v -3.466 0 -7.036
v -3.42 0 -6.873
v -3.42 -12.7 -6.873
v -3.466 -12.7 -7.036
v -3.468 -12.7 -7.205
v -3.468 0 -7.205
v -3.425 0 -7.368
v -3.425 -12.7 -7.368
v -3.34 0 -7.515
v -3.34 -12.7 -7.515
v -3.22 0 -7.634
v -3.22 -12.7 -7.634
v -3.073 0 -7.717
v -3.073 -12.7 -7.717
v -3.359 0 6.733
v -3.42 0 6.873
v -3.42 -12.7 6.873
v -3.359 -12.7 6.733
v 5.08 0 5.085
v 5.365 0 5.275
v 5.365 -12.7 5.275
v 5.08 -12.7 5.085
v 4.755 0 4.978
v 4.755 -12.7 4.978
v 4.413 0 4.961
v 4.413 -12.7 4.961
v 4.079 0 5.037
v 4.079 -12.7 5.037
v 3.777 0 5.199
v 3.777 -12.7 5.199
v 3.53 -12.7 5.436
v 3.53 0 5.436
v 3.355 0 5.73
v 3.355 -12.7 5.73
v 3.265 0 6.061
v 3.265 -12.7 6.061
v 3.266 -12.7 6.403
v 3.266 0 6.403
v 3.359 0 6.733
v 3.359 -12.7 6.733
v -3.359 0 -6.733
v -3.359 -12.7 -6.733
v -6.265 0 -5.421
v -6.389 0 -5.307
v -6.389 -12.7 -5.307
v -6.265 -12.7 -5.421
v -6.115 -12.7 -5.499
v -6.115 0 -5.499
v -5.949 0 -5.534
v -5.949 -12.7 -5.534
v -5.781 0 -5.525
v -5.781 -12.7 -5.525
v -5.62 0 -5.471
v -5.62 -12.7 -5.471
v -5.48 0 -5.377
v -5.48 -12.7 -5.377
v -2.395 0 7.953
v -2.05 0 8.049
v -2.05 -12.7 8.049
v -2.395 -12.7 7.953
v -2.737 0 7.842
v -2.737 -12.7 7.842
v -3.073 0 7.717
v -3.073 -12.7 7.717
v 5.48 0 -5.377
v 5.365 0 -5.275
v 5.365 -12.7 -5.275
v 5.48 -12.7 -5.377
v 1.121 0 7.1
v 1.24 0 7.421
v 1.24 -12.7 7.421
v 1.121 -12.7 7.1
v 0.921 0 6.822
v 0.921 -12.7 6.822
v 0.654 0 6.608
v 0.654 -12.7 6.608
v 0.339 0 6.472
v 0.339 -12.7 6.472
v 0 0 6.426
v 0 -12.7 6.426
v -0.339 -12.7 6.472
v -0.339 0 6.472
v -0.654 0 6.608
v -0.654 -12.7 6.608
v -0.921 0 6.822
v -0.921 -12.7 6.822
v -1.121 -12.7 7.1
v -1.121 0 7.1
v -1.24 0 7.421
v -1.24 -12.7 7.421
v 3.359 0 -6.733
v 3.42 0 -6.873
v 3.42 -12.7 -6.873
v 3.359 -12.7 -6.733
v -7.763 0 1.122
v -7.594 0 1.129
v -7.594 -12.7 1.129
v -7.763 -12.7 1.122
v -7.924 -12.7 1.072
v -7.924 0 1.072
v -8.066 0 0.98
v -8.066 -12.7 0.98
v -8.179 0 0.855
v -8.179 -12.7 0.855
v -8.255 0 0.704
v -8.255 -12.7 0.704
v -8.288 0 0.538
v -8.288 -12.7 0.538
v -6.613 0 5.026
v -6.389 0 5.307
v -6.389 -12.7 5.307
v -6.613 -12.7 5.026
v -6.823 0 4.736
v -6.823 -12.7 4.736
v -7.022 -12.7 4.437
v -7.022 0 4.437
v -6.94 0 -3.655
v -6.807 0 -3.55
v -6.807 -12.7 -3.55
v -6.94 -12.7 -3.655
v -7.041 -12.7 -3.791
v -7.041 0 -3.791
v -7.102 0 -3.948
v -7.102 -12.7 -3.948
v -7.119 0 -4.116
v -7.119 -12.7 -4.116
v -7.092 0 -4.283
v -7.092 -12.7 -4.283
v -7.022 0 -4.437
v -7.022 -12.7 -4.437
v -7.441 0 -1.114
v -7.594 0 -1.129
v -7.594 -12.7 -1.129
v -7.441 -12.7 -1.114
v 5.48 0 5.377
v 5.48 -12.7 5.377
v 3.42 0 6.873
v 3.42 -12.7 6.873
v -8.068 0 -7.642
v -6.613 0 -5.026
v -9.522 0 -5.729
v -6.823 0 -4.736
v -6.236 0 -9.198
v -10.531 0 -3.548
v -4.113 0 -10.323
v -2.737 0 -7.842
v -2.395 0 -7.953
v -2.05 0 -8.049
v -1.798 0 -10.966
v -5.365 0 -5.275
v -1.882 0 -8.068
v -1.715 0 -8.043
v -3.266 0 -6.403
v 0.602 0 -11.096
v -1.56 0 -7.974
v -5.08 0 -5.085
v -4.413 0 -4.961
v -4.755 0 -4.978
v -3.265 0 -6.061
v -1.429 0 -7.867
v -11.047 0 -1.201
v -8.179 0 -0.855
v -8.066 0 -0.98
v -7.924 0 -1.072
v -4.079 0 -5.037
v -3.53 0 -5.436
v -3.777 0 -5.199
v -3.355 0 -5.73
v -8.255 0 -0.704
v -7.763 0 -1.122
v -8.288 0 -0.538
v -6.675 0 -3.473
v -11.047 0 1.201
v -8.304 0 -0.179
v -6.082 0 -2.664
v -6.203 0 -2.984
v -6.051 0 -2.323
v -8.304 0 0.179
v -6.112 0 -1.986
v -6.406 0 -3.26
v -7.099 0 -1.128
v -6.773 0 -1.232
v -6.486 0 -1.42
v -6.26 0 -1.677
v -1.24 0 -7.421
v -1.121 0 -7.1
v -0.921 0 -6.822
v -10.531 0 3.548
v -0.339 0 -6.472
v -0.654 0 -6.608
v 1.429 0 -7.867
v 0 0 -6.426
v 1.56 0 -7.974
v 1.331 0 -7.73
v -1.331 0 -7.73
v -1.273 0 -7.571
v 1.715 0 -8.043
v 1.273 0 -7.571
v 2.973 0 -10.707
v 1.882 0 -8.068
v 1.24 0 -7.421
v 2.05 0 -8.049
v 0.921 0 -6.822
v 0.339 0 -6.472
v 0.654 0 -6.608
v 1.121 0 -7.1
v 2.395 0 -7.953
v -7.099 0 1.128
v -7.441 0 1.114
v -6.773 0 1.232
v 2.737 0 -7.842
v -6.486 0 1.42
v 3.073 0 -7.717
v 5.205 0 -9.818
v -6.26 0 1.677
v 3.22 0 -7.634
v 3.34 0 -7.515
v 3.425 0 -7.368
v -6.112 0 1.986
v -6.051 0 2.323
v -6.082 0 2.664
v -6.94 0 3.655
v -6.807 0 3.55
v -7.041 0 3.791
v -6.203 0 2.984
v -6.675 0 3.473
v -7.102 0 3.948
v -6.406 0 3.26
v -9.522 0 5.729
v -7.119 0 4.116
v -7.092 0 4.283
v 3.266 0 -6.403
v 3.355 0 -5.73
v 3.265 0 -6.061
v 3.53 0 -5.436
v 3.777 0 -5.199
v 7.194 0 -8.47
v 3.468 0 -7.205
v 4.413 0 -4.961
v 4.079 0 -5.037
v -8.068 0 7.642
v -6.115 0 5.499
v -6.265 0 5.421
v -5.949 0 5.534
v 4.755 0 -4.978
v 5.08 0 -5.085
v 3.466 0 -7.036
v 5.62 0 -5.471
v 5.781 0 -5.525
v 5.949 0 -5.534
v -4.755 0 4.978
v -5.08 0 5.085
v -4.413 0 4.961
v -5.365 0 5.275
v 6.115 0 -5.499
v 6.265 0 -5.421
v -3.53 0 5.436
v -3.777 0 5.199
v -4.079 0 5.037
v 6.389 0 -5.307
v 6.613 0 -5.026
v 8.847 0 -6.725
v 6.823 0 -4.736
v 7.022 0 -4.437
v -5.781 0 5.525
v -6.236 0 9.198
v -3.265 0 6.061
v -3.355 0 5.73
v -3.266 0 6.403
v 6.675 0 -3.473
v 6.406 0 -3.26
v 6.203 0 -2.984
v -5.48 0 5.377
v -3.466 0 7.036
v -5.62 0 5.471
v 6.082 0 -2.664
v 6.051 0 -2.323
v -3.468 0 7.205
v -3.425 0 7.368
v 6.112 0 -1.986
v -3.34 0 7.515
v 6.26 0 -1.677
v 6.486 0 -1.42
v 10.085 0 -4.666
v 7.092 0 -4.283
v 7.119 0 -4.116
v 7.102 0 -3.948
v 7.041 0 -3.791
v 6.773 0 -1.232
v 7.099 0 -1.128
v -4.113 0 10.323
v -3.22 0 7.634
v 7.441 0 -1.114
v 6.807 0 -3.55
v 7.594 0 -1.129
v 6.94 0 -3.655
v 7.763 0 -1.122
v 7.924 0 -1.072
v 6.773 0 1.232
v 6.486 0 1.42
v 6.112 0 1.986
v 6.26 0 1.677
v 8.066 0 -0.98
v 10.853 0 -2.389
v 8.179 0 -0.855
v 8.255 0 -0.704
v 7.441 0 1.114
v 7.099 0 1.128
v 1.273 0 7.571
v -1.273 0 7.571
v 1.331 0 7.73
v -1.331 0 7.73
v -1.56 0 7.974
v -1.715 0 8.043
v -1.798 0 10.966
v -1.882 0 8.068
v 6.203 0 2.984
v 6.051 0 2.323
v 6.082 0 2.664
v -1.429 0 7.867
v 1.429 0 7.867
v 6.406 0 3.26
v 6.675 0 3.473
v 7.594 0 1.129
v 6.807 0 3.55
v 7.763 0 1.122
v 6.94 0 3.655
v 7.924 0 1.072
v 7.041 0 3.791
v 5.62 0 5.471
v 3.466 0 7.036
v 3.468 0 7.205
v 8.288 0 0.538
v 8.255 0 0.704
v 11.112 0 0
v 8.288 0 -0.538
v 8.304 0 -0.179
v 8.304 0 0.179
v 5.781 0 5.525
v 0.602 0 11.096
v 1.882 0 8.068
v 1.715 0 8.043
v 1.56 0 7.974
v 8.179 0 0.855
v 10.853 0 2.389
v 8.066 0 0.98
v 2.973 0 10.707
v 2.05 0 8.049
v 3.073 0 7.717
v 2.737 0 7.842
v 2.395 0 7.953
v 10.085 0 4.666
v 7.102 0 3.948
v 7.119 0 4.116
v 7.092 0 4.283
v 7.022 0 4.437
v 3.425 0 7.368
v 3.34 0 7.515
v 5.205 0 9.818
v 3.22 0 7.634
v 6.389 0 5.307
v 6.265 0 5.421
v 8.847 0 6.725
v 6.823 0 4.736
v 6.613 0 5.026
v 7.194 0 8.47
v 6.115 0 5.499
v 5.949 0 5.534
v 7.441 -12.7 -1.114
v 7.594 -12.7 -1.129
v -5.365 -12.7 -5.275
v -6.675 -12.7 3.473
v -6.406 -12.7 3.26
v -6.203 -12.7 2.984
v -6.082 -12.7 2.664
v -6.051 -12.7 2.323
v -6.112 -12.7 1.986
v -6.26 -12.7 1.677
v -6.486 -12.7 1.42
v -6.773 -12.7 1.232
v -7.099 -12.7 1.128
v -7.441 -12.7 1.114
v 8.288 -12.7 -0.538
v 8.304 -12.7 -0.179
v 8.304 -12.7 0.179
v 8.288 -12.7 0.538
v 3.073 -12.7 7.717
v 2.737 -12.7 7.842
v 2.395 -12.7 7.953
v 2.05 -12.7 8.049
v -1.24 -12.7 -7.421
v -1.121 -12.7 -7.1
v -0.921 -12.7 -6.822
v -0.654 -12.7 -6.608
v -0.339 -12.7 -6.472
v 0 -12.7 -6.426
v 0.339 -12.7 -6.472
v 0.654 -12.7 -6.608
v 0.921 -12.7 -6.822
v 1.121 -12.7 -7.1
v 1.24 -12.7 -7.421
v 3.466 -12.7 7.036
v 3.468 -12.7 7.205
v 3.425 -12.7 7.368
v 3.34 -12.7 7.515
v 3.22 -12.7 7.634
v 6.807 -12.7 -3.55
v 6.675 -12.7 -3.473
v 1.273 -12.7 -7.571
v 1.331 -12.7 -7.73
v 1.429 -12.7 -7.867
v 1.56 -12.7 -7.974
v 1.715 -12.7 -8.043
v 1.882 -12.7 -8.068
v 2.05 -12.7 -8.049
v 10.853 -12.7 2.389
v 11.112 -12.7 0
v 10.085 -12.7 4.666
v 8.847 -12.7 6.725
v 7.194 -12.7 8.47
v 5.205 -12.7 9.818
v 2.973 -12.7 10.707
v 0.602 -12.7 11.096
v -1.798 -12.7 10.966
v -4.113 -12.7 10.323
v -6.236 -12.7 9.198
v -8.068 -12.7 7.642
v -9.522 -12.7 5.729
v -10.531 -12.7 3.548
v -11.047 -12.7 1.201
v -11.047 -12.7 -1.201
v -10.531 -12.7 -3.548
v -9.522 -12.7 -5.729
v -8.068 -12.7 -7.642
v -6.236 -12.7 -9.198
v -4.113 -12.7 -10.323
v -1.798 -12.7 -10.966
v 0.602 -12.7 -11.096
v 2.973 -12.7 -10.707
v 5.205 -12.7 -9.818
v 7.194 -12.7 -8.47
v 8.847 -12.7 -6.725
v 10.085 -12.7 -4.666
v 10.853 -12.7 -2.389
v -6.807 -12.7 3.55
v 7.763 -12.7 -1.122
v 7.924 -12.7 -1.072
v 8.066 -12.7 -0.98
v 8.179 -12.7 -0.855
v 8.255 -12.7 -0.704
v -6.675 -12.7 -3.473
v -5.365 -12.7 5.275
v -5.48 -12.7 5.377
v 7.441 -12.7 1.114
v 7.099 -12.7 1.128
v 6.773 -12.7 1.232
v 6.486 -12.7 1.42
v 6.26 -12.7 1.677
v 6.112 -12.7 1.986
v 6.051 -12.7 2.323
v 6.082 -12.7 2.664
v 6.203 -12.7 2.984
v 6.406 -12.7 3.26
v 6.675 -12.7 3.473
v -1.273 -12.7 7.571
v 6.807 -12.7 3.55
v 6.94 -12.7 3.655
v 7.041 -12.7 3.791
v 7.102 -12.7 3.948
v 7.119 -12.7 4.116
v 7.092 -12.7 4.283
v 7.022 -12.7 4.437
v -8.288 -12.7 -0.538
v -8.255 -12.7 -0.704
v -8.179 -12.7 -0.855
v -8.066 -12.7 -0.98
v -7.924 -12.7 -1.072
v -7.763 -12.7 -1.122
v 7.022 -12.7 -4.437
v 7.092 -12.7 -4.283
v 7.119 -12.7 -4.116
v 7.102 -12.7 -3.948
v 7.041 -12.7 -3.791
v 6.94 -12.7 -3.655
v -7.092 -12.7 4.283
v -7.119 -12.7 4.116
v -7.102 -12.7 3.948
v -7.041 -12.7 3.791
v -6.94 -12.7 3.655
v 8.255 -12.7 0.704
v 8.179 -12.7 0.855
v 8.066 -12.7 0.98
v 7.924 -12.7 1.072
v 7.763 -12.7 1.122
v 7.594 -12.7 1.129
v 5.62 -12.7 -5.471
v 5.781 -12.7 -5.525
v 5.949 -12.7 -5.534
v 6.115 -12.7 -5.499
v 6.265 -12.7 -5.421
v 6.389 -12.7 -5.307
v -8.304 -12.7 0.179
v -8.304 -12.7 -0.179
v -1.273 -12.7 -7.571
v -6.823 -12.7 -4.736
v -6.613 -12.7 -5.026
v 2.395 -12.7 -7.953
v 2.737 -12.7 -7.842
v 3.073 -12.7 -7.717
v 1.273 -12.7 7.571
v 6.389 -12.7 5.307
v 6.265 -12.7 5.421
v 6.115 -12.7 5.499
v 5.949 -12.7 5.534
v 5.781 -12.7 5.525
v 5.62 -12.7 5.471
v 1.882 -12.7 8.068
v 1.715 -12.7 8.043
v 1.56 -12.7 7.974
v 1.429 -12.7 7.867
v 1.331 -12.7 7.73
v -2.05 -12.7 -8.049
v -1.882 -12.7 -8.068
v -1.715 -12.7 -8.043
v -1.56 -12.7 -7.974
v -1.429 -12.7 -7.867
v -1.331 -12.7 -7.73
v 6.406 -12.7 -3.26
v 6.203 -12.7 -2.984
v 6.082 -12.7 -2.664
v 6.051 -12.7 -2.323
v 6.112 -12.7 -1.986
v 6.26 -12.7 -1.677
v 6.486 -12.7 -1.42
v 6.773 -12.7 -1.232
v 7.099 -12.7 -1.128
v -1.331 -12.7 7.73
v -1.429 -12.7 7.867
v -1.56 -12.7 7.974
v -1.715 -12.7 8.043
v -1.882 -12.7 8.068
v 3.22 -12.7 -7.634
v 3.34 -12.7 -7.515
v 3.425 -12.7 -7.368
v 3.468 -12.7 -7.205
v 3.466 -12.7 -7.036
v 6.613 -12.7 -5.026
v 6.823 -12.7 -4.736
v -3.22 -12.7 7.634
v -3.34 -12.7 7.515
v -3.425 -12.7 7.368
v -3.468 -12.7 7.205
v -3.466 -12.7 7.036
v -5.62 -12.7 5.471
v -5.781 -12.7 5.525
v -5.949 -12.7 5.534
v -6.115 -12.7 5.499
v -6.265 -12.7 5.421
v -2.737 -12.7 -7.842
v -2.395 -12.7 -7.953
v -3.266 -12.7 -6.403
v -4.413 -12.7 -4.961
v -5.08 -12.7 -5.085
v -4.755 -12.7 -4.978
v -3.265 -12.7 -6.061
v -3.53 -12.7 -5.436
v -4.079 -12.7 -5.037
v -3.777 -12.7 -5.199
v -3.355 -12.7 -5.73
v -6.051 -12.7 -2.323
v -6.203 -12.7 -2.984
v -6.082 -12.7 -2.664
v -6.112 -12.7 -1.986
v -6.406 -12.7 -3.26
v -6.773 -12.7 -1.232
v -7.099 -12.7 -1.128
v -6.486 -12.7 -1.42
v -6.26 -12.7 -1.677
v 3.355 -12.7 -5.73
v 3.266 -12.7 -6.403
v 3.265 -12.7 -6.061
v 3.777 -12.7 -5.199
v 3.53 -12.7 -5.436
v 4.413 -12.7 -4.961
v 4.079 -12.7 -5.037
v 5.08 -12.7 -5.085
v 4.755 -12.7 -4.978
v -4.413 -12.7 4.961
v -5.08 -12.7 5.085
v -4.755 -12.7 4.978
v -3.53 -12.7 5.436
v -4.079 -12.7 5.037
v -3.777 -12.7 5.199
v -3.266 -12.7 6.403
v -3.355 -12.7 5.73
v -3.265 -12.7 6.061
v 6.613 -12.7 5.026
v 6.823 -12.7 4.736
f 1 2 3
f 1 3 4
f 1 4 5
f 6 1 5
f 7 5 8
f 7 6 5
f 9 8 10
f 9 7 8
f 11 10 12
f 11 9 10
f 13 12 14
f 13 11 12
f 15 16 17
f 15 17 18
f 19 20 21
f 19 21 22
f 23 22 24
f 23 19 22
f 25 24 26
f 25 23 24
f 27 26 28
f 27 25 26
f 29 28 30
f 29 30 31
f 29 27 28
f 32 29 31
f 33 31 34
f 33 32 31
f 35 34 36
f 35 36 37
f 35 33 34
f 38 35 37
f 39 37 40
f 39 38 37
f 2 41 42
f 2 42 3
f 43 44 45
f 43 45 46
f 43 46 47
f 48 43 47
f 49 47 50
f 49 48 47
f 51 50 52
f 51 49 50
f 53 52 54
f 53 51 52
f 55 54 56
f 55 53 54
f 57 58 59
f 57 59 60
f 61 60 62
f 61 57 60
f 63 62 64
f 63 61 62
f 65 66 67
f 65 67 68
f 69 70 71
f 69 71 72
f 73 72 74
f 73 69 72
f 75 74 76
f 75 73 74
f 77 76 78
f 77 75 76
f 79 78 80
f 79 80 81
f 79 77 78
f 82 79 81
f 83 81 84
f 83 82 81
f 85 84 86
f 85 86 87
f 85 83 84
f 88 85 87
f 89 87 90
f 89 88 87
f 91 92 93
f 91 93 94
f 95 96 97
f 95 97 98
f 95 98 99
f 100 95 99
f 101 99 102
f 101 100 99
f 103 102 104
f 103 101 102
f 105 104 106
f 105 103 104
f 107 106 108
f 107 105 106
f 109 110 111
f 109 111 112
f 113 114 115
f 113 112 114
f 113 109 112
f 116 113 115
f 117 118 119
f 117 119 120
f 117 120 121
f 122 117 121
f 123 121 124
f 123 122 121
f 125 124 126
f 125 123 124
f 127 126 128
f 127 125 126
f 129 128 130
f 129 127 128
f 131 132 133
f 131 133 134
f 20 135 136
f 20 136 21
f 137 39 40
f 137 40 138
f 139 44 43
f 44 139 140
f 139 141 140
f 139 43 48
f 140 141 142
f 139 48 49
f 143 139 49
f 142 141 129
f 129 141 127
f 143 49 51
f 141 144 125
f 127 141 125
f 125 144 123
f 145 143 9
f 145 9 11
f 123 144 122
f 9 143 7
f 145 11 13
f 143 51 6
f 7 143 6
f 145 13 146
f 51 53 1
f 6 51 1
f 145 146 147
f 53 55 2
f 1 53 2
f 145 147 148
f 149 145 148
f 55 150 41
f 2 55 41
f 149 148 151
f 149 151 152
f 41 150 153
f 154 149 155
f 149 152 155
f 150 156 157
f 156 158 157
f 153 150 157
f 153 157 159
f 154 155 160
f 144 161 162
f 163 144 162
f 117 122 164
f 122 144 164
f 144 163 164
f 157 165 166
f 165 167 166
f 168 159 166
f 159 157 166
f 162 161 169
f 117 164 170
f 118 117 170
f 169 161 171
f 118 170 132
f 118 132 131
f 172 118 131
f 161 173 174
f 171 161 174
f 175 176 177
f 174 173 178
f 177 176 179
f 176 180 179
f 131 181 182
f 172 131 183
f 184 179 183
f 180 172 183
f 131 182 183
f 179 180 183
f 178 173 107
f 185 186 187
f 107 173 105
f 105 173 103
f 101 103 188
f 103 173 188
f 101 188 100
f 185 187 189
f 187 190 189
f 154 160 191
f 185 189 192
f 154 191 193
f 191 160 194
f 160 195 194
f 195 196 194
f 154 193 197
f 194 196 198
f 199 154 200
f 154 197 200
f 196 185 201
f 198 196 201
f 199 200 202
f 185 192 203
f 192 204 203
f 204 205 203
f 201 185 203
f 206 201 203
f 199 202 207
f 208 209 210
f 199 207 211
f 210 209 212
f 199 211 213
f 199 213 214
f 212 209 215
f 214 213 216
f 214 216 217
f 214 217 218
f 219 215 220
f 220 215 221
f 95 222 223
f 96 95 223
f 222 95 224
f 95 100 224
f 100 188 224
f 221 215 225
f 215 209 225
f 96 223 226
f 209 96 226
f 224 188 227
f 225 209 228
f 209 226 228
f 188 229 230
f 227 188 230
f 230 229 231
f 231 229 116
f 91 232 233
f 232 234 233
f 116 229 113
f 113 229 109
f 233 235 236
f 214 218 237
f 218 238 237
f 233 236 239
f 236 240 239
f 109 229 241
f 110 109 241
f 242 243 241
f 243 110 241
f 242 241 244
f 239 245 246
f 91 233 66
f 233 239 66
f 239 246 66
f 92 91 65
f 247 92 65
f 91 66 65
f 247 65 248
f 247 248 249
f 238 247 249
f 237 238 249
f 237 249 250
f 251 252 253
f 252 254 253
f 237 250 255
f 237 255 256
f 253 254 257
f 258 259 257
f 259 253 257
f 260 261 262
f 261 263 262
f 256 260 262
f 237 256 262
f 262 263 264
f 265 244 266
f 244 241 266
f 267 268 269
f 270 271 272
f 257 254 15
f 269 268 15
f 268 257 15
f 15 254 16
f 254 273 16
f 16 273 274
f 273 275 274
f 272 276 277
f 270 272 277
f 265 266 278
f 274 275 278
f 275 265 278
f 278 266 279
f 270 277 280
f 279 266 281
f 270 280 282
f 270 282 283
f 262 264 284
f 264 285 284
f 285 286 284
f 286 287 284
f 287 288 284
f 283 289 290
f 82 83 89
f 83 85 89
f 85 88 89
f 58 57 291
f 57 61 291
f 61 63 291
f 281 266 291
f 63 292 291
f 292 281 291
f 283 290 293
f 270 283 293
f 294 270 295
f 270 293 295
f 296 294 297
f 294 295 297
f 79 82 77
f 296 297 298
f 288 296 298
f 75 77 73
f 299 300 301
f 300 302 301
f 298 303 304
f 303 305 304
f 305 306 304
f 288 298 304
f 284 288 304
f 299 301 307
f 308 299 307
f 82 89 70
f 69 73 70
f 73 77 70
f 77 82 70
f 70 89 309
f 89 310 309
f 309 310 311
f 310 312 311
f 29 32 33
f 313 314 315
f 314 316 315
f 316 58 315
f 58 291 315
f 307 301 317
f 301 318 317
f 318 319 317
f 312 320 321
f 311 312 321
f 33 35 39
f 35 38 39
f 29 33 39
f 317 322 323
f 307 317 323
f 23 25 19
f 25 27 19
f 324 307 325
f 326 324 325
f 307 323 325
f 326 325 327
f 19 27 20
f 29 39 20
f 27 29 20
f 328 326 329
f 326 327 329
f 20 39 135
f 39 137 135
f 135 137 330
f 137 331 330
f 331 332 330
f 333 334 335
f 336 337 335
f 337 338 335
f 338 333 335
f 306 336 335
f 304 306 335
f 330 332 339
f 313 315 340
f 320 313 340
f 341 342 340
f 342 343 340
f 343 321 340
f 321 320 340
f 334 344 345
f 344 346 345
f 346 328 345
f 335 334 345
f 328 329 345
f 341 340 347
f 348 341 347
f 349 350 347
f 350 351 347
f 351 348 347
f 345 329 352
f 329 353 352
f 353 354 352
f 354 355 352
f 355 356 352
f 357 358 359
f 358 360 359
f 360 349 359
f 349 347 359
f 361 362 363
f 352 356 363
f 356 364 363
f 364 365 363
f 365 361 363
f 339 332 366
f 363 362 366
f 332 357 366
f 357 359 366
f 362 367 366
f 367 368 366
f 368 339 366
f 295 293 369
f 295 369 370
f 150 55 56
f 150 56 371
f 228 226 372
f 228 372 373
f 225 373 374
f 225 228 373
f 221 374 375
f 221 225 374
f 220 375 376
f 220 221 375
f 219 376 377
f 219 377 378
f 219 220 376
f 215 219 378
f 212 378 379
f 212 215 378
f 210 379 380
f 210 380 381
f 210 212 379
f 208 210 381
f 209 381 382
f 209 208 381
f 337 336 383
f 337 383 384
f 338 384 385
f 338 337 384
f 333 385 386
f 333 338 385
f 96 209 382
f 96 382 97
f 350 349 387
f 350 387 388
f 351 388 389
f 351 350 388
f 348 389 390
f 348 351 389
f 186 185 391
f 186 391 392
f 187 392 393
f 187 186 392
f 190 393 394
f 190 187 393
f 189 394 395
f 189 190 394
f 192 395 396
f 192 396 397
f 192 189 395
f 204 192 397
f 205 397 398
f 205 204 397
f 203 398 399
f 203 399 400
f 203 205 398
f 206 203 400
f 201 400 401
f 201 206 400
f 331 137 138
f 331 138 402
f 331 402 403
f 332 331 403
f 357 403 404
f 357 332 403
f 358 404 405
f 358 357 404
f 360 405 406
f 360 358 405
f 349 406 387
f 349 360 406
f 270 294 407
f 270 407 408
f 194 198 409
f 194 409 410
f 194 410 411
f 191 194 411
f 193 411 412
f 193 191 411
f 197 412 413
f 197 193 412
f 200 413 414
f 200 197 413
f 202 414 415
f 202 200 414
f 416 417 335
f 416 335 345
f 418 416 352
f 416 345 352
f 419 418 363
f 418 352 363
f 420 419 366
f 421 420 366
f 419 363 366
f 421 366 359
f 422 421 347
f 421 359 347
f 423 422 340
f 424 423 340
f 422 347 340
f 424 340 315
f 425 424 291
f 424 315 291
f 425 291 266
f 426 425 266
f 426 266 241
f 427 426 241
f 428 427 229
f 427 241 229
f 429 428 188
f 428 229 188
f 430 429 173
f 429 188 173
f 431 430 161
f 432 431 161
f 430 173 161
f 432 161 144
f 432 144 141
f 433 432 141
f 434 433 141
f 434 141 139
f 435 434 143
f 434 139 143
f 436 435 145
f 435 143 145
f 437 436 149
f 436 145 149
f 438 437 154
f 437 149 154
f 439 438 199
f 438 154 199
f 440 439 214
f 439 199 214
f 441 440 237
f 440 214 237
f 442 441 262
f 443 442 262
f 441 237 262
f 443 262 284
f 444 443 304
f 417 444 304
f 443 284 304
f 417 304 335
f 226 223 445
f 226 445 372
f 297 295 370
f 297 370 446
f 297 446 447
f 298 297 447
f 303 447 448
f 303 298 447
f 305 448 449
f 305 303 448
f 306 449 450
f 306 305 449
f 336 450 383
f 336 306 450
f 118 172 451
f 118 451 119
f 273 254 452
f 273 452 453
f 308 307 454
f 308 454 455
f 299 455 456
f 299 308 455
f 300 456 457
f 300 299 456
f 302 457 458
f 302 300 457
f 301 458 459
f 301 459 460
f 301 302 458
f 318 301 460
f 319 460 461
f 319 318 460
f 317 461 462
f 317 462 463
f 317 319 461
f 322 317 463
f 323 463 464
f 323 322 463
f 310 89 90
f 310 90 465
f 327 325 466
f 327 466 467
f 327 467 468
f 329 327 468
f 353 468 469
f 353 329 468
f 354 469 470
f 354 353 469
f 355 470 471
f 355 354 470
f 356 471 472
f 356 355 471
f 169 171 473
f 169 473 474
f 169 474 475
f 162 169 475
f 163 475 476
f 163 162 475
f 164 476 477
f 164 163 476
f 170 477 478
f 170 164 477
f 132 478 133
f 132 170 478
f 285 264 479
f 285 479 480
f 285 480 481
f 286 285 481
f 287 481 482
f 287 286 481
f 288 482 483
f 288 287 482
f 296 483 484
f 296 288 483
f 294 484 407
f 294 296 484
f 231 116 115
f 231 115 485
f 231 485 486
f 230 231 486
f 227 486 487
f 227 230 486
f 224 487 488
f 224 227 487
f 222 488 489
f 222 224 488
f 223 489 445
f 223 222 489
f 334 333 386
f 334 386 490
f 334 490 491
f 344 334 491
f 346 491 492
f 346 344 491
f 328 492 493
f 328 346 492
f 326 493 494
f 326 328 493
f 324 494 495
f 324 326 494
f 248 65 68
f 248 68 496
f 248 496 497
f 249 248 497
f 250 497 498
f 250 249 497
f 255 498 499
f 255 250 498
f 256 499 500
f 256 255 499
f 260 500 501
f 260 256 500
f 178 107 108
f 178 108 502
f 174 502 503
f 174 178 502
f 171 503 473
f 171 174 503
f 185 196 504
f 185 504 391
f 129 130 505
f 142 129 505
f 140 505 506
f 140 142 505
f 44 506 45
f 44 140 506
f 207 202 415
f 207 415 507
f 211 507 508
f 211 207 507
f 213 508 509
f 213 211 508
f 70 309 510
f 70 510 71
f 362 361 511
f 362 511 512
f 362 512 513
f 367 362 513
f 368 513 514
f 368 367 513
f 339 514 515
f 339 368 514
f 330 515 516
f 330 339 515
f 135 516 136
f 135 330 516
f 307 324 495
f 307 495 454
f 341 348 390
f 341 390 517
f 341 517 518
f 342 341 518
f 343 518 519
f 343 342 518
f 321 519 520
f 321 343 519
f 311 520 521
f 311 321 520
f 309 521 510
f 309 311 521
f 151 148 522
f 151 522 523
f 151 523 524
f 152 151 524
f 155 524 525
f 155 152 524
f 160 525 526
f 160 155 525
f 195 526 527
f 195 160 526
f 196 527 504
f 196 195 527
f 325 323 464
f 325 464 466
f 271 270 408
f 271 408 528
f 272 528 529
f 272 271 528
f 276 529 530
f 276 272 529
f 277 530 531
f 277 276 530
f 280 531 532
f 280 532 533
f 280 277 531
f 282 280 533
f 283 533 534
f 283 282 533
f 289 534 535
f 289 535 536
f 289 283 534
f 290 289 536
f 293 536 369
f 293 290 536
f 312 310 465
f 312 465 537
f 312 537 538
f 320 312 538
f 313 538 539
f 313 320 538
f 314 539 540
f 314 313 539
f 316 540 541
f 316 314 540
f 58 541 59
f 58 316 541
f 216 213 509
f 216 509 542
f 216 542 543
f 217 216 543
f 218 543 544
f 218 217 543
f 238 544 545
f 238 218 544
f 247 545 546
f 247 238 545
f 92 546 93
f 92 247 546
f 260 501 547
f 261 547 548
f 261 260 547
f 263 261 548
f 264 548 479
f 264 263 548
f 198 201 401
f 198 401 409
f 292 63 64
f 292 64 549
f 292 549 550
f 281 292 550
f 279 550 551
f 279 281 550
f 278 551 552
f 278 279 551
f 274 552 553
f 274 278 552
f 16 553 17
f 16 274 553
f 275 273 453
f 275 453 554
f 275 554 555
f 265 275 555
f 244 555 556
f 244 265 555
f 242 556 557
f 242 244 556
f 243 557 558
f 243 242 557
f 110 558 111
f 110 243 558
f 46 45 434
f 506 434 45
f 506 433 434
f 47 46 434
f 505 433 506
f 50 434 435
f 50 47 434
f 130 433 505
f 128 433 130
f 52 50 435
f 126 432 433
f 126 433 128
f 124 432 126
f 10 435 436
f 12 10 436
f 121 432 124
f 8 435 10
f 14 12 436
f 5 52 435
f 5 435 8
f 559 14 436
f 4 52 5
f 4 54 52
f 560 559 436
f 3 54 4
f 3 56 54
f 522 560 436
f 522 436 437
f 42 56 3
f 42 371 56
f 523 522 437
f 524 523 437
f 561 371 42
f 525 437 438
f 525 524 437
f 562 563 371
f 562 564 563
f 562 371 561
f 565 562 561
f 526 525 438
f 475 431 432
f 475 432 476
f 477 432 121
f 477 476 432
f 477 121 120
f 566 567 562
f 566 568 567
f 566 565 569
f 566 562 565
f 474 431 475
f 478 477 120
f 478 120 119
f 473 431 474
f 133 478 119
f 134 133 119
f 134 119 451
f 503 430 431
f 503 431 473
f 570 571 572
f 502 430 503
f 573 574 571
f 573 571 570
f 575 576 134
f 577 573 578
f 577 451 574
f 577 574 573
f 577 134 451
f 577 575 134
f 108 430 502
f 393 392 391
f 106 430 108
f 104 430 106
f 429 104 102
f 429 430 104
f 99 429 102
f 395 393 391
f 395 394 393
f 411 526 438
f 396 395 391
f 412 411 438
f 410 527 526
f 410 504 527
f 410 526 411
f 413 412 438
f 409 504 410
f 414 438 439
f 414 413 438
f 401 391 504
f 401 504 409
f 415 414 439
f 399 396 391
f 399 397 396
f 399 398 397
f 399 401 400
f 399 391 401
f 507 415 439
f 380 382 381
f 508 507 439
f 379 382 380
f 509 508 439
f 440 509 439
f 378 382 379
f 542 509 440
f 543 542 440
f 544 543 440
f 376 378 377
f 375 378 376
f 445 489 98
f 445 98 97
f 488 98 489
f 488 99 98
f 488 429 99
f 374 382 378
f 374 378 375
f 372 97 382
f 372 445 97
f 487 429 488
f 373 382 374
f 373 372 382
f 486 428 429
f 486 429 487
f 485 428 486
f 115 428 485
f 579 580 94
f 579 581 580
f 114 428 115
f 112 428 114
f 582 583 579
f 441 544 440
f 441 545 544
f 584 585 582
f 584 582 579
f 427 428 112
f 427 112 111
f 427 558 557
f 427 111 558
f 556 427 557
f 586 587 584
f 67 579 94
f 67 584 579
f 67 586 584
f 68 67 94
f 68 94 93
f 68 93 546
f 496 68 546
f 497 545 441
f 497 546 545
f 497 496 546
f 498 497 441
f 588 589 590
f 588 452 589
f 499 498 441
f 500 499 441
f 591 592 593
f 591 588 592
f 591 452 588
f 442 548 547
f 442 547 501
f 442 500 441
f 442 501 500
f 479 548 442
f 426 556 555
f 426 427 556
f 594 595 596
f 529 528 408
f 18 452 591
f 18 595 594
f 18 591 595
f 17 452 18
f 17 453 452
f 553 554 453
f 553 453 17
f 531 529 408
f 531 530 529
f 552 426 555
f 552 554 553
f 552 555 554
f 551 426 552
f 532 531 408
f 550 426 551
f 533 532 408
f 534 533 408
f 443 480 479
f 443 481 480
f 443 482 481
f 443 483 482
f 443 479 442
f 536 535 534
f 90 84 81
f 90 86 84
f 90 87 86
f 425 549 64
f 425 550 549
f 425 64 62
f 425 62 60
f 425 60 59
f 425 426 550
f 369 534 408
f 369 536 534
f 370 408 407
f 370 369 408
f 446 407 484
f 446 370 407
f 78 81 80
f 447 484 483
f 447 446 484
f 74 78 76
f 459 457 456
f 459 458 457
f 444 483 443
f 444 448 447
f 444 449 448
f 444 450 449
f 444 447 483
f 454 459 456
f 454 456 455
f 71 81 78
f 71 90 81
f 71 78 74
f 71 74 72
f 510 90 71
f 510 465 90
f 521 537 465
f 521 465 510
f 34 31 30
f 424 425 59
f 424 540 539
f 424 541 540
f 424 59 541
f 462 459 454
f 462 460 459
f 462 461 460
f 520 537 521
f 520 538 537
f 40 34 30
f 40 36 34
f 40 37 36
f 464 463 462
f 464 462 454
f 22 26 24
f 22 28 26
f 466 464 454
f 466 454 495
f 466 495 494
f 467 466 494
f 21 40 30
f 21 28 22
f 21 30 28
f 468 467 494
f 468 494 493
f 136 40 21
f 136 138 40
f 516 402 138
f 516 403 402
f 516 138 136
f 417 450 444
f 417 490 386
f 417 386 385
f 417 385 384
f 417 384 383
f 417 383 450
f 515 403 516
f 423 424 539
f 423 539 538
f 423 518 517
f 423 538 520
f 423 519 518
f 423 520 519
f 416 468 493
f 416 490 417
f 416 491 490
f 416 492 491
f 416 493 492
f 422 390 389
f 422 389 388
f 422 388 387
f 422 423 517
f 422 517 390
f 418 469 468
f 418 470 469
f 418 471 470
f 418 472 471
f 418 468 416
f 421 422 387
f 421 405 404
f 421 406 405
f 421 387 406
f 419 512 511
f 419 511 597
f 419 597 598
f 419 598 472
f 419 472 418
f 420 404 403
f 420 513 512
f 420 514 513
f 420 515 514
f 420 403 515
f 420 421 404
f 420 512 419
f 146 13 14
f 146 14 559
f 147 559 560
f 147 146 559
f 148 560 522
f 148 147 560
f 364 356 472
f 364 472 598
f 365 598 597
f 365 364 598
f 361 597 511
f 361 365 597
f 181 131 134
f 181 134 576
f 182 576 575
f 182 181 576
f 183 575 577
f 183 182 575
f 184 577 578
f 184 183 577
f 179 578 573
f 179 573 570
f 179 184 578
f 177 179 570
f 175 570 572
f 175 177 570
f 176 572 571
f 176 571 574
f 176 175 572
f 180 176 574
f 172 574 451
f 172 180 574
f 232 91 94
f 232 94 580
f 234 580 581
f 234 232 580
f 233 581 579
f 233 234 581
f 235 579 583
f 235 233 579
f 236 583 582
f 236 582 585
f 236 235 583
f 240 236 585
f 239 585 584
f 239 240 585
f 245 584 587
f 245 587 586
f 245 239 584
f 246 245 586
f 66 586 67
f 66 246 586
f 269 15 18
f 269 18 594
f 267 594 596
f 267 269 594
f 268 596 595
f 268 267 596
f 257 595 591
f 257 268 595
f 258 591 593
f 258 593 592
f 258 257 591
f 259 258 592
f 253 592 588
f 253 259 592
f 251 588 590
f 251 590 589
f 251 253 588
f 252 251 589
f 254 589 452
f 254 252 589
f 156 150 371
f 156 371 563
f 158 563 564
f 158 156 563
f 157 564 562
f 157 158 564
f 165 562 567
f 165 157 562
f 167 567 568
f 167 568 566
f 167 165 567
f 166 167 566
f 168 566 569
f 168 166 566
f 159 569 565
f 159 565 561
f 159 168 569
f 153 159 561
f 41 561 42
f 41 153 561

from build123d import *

# Parameters (mm, degrees)
F1_R            = 11.1125
F1_R_2          = 8.3058
F2_DEPTH        = 12.7
F4_DEPTH        = 12.7
F4_COPIES_COUNT = 10


# Not quite as in the source:
# - a pattern or mirror of a feature is missing from the dataset's text; its kind, count and spacing are read off the source's solid


with BuildPart() as f2:
    # F1 (on Front) → F2 (new body)
    with BuildSketch(Plane.XZ):
        Circle(F1_R)
        Circle(F1_R_2, mode=Mode.SUBTRACT)
    extrude(amount=F2_DEPTH)

    # F3 (on face) → F4 (join, through all)
    with BuildSketch(Plane(origin=(0, 0, 0), x_dir=(-1, 0, 0), z_dir=(0, 1, 0))):
        with BuildLine():
            ThreePointArc((-2.0497311639, 8.0489077393), (-1.5602325902, 7.9743573542), (-1.2730759239, 7.5709869752))
            Line((-1.2730759239, 7.5709869752), (-1.239895929, 7.4213216903))
            ThreePointArc((-1.239895929, 7.4213216903), (0, 6.4262), (1.239895929, 7.4213216903))
            Line((1.239895929, 7.4213216903), (1.2730759239, 7.5709869752))
            ThreePointArc((1.2730759239, 7.5709869752), (1.5602325902, 7.9743573542), (2.0497311639, 8.0489077393))
            ThreePointArc((2.0497311639, 8.0489077393), (0, 8.3058), (-2.0497311639, 8.0489077393))
        make_face()
    f4 = extrude(amount=-F4_DEPTH)

    # F4_copies: F4 ×10 about axis
    f4_copies_axis = Axis((0, 0, 0), (0, 1, 0))
    for i in range(1, F4_COPIES_COUNT):
        add(f4.rotate(f4_copies_axis, i * 360 / F4_COPIES_COUNT))


solid = f2.part
